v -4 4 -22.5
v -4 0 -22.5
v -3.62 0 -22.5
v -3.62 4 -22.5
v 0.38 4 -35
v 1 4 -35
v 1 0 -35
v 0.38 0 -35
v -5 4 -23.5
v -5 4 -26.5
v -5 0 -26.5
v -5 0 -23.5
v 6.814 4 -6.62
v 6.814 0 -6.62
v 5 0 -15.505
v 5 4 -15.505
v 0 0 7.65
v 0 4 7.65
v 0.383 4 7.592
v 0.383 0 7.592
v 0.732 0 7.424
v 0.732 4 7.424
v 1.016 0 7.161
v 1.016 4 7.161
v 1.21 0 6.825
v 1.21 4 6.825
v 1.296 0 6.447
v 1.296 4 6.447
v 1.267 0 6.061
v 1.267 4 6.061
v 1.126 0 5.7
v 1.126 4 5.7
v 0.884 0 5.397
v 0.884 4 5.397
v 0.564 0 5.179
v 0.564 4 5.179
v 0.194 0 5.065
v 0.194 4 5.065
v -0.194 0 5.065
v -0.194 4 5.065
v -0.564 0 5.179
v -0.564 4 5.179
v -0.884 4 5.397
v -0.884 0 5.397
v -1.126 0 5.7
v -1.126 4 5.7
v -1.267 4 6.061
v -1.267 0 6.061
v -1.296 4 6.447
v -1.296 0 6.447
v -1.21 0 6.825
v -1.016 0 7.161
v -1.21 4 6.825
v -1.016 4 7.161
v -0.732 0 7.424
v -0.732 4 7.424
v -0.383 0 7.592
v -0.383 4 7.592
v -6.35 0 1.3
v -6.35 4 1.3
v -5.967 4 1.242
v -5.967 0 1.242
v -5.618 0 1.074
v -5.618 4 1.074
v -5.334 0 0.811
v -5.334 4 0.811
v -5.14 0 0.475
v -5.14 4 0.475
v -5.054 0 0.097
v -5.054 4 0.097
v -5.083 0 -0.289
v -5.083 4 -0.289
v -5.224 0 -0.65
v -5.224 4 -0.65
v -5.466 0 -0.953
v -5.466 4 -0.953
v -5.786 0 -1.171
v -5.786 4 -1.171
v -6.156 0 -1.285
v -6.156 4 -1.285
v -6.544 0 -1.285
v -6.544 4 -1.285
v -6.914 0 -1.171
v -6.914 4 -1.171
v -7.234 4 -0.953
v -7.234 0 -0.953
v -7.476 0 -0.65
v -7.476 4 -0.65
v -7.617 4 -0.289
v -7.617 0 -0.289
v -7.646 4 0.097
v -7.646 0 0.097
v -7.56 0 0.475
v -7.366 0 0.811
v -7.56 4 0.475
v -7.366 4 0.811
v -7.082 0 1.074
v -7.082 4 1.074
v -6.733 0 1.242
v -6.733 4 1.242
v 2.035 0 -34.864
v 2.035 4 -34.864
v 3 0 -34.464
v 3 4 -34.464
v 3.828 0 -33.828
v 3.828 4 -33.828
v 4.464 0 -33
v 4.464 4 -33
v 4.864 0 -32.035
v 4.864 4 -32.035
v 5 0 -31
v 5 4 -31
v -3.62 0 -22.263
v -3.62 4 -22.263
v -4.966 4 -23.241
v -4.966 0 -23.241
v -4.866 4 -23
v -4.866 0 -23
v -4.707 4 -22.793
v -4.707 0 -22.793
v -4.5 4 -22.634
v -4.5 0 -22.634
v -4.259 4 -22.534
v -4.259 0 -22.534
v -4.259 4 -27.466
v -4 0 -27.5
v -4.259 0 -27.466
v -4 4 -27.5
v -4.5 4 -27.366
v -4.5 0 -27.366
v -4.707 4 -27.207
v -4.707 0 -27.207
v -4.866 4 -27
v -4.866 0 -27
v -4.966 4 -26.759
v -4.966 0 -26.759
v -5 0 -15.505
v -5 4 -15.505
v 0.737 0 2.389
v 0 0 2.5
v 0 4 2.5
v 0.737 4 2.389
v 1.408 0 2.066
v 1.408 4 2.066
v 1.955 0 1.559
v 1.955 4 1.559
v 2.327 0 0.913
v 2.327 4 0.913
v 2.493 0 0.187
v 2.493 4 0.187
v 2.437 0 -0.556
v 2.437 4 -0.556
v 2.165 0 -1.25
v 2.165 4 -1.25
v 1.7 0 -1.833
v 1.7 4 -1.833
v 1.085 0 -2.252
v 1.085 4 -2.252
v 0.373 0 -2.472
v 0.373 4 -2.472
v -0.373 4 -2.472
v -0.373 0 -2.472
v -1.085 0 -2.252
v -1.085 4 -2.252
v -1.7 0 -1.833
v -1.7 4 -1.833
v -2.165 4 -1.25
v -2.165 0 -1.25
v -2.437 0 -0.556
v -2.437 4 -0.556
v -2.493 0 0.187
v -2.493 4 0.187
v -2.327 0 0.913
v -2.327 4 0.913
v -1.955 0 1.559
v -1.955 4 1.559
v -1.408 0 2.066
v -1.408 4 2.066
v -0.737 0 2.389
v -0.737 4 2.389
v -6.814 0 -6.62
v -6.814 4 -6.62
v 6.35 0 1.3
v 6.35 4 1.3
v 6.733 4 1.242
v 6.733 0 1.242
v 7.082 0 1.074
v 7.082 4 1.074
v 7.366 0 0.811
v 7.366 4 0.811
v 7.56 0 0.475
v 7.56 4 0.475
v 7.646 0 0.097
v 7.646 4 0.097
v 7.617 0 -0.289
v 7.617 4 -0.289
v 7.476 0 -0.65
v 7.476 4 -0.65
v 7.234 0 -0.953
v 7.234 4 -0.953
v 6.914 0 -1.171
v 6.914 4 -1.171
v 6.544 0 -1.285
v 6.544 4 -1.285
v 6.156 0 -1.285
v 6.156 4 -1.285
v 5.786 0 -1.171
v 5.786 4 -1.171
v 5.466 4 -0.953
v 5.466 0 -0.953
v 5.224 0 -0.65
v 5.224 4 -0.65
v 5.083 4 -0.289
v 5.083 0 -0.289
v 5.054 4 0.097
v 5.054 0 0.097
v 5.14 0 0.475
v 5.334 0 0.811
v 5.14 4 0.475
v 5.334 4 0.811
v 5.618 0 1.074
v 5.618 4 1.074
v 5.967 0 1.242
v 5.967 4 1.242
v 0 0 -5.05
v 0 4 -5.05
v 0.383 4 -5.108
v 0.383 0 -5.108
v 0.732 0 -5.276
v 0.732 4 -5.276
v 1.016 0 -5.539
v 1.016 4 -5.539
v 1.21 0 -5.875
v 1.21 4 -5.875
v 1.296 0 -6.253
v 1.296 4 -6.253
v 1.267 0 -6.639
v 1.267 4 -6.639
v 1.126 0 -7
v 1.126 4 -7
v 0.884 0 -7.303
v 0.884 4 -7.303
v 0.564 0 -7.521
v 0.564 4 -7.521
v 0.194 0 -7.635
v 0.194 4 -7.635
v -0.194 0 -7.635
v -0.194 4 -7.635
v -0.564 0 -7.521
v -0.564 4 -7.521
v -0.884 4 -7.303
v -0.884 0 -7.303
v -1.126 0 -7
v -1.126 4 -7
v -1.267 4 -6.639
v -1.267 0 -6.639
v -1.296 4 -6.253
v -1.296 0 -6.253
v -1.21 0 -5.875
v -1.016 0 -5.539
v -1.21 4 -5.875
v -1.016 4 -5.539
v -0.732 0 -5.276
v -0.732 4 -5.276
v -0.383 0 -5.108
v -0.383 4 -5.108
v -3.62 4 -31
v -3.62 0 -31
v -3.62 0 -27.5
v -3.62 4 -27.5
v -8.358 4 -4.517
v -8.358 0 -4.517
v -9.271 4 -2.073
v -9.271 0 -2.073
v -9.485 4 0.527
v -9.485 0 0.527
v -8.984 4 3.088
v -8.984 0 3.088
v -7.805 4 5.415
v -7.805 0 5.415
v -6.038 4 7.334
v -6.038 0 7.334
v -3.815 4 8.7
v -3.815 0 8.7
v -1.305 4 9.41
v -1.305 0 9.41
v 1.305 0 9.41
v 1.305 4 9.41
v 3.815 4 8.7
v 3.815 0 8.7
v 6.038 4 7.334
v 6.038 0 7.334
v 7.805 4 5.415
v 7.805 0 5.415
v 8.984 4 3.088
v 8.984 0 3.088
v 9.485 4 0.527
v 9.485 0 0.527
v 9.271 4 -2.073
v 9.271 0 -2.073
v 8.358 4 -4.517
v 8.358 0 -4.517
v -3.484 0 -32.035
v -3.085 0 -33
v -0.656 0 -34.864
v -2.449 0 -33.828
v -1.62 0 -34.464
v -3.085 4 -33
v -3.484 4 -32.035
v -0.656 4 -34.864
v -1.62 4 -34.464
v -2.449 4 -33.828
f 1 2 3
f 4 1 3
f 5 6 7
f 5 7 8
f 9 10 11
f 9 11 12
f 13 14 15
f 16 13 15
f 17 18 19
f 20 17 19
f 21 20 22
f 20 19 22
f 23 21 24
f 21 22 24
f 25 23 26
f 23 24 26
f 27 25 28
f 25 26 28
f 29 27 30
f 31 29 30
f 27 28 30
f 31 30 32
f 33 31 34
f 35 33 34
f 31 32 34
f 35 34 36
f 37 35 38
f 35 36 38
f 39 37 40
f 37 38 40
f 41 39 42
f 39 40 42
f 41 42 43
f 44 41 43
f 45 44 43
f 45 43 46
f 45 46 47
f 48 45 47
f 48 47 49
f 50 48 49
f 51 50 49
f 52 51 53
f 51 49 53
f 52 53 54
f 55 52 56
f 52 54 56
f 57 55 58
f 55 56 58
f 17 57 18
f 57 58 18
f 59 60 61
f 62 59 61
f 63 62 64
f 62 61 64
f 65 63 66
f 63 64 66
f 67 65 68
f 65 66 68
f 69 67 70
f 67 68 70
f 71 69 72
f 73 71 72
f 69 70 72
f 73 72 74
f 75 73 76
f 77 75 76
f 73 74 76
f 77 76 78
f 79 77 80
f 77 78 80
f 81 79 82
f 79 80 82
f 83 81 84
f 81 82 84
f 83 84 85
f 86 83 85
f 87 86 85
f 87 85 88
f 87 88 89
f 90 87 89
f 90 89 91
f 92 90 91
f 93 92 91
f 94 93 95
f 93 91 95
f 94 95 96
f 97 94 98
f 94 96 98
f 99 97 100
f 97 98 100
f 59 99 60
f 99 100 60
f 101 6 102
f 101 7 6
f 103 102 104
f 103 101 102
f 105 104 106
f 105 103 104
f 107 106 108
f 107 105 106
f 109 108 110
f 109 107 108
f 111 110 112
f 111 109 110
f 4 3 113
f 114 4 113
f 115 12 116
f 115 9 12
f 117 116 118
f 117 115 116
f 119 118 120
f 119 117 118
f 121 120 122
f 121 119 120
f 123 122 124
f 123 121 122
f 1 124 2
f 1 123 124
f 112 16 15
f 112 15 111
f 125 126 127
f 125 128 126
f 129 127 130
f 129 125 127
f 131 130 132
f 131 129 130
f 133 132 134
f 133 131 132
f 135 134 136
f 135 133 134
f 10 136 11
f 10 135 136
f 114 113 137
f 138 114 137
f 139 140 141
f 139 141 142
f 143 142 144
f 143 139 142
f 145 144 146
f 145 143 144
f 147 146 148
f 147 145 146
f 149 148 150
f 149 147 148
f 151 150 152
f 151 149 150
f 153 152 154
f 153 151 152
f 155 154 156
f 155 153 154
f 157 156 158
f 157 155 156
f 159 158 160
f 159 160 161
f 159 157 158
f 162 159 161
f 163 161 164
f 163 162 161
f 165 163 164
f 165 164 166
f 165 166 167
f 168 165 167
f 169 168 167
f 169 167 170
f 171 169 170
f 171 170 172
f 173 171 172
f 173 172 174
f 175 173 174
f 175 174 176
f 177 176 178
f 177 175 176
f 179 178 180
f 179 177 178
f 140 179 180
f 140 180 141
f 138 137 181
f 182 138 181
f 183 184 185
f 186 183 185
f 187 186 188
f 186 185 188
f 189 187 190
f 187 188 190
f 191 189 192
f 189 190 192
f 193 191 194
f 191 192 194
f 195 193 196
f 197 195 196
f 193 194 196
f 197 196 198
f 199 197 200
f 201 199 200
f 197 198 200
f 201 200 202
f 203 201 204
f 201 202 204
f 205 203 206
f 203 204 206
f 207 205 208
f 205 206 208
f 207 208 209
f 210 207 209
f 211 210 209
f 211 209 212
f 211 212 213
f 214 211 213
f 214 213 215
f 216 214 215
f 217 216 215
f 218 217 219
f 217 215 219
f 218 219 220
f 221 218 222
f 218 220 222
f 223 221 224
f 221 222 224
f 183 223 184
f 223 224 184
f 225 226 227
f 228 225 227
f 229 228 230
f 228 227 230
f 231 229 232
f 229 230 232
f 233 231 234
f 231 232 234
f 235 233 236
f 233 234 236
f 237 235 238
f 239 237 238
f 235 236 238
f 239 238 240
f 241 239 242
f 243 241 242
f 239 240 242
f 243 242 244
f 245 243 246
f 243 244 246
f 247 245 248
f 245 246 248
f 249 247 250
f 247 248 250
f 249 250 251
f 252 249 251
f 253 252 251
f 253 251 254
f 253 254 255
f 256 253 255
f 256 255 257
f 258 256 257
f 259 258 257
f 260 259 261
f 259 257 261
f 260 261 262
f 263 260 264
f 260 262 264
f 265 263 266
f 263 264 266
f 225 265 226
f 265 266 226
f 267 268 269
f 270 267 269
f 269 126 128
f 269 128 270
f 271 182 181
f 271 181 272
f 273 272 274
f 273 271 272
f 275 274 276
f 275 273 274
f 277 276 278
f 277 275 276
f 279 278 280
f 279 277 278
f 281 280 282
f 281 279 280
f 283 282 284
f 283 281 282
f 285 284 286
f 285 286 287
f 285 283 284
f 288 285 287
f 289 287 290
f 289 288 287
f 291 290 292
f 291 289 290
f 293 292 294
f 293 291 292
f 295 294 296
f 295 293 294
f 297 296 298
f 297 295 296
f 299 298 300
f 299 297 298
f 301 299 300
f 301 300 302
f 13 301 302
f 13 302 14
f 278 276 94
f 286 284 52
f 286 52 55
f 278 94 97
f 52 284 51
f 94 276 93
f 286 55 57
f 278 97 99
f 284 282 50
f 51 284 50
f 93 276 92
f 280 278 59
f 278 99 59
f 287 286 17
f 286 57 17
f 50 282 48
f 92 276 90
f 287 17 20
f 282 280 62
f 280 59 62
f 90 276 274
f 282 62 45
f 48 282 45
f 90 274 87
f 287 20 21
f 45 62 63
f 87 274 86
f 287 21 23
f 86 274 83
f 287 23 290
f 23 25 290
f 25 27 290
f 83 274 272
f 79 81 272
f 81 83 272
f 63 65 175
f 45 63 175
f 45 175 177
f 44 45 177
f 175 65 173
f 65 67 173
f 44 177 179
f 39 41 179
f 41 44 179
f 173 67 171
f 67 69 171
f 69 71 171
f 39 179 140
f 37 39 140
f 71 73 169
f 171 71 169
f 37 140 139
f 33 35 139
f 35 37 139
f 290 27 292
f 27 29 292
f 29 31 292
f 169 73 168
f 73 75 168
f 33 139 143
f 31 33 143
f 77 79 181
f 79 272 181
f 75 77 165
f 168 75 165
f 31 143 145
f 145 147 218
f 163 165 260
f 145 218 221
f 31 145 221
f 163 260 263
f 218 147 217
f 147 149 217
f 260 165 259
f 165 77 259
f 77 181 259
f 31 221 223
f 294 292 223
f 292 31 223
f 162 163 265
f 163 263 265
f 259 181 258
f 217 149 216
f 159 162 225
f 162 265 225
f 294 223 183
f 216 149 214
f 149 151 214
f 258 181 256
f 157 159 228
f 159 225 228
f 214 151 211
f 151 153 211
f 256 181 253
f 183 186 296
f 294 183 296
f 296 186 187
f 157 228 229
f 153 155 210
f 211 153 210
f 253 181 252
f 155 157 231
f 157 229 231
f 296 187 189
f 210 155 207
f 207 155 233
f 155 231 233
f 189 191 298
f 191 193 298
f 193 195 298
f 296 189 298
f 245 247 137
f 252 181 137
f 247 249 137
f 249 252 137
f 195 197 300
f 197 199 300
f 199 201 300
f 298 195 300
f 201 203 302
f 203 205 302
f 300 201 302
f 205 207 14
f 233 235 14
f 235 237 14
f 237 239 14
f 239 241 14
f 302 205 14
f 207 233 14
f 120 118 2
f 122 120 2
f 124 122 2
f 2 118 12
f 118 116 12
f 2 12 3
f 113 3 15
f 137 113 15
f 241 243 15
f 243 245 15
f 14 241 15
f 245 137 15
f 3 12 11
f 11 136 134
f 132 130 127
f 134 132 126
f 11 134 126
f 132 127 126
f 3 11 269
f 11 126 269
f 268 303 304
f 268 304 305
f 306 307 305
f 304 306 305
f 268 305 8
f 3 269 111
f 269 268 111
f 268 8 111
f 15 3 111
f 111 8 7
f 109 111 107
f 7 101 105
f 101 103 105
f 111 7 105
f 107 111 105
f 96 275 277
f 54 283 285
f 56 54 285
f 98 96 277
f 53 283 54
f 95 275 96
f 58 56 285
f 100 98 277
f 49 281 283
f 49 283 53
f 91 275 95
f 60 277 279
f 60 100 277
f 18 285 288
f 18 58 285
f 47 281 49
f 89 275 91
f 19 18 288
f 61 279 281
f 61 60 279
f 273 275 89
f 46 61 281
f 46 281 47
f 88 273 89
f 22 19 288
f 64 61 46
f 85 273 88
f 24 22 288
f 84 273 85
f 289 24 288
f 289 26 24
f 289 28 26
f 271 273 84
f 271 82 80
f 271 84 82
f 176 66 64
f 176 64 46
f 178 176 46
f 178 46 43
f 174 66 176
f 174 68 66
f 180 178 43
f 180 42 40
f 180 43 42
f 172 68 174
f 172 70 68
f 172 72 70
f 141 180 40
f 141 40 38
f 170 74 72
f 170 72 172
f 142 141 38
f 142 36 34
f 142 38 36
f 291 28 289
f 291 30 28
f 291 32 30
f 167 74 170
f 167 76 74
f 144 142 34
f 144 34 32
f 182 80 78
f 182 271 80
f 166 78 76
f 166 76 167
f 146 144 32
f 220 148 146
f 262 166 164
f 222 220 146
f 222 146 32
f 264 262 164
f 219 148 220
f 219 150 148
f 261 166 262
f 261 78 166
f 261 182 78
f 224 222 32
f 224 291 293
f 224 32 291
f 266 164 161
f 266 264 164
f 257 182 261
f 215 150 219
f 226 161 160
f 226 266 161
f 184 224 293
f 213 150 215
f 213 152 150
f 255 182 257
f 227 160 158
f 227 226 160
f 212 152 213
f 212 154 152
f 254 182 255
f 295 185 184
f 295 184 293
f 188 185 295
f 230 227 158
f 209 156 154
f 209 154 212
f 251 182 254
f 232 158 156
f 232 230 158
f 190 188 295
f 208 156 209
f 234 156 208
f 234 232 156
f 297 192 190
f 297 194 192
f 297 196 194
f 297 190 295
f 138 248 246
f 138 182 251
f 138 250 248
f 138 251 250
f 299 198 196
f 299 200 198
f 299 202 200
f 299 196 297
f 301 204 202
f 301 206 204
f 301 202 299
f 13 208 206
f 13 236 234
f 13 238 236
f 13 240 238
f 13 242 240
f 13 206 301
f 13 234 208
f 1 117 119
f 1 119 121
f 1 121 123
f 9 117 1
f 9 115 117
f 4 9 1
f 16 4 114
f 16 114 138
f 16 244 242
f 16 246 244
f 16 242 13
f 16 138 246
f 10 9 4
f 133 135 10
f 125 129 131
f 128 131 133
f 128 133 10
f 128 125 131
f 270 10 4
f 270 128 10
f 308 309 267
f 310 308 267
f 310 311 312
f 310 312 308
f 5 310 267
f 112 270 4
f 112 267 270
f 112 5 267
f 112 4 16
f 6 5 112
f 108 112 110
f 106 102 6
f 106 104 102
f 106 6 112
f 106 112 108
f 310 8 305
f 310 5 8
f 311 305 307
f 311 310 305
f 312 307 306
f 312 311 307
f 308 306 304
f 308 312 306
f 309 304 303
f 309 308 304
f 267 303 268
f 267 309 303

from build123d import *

# Parameters (mm, degrees)
SKETCH1_R           = 3
SKETCH1_R_2         = 2.5
BOSS_EXTRUDE1_DEPTH = 4
SKETCH2_R           = 1.3
CUT_EXTRUDE1_DEPTH  = 4
BOSS_EXTRUDE2_DEPTH = 4
SKETCH4_R           = 3
BOSS_EXTRUDE3_DEPTH = 4
SKETCH6_W           = 1.3795464
SKETCH6_H           = 7.5
CUT_EXTRUDE2_DEPTH  = 9
FILLET3_R           = 4
FILLET4_R           = 1


with BuildPart() as part:
    # Sketch1 → Boss-Extrude1 (new body)
    with BuildSketch(Plane(origin=(0, 0, 0), x_dir=(1, 0, 0), z_dir=(0, 1, 0))):
        with BuildLine():
            Line((-4.531642246, 17.7995776), (-7.838367177, 1.6))
            ThreePointArc((-7.838367177, 1.6), (0, -8), (7.838367177, 1.6))
            Line((7.838367177, 1.6), (4.531642246, 17.7995776))
            ThreePointArc((4.531642246, 17.7995776), (0, 21.499648), (-4.531642246, 17.7995776))
        make_face()
        with Locations(Location((0, 16.87456, 0), (0, 0, 270))):
            Circle(SKETCH1_R, mode=Mode.SUBTRACT)
        with Locations(Location((0, 0, 0), (0, 0, 270))):
            Circle(SKETCH1_R_2, mode=Mode.SUBTRACT)
    extrude(amount=BOSS_EXTRUDE1_DEPTH)

    # Sketch2 → Cut-Extrude1 (cut)
    with BuildSketch(Plane(origin=(0, 4, 0), x_dir=(1, 0, 0), z_dir=(0, 1, 0))):
        with Locations(Location((0, 6.35, 0), (0, 0, 270))):
            Circle(SKETCH2_R)
        with Locations(Location((6.35, 0, 0), (0, 0, 270))):
            Circle(SKETCH2_R)
        with Locations(Location((0, -6.35, 0), (0, 0, 270))):
            Circle(SKETCH2_R)
        with Locations(Location((-6.35, 0, 0), (0, 0, 270))):
            Circle(SKETCH2_R)
    extrude(amount=-CUT_EXTRUDE1_DEPTH, mode=Mode.SUBTRACT)

    # Sketch3 → Boss-Extrude2 (add)
    with BuildSketch(Plane(origin=(0, 4, 0), x_dir=(1, 0, 0), z_dir=(0, 1, 0))):
        with BuildLine():
            Line((-7.838367177, 1.6), (-6.8136721, 6.619960159))
            ThreePointArc((-6.8136721, 6.619960159), (0, -9.5), (6.8136721, 6.619960159))
            Line((6.8136721, 6.619960159), (7.838367177, 1.6))
            ThreePointArc((7.838367177, 1.6), (0, -8), (-7.838367177, 1.6))
        make_face()
    extrude(amount=-BOSS_EXTRUDE2_DEPTH)

    # Sketch4 → Boss-Extrude3 (add)
    with BuildSketch(Plane(origin=(0, 4, 0), x_dir=(1, 0, 0), z_dir=(0, 1, 0))):
        with BuildLine():
            Line((5, 35), (0, 35))
            Line((0, 35), (-5, 35))
            Line((-5, 35), (-5, 15.505102572))
            Line((-5, 15.505102572), (-4.531642246, 17.7995776))
            ThreePointArc((-4.531642246, 17.7995776), (0, 21.499648), (4.531642246, 17.7995776))
            Line((4.531642246, 17.7995776), (5, 15.505102572))
            Line((5, 15.505102572), (5, 35))
        make_face()
        with BuildLine():
            Line((5, 10), (5, 15.505102572))
            Line((5, 15.505102572), (4.531642246, 17.7995776))
            ThreePointArc((4.531642246, 17.7995776), (0, 21.499648), (-4.531642246, 17.7995776))
            Line((-4.531642246, 17.7995776), (-5, 15.505102572))
            Line((-5, 15.505102572), (-5, 10))
            Line((-5, 10), (0, 10))
            Line((0, 10), (5, 10))
        make_face()
        with Locations((0, 16.87456)):
            Circle(SKETCH4_R, mode=Mode.SUBTRACT)
        with Locations((0, 16.87456)):
            Circle(SKETCH4_R)
    extrude(amount=-BOSS_EXTRUDE3_DEPTH)

    # Sketch6 → Cut-Extrude2 (cut)
    with BuildSketch(Plane.XZ):
        with Locations((-4.3102268, -31.25)):
            Rectangle(SKETCH6_W, SKETCH6_H)
        Polygon((-3.6204536, -22.263472087), (-5, -15.505102572), (-5, -22.5), (-3.6204536, -22.5), align=None)
    extrude(amount=-CUT_EXTRUDE2_DEPTH, mode=Mode.SUBTRACT)

    # Fillet3
    fillet3_edges = [part.edges().sort_by_distance(p)[0] for p in [
        (5, 2, -35),
        (-3.6204536, 2, -35),
    ]]
    fillet(fillet3_edges, radius=FILLET3_R)

    # Fillet4
    fillet4_edges = [part.edges().sort_by_distance(p)[0] for p in [
        (-5, 2, -22.5),
        (-5, 2, -27.5),
    ]]
    fillet(fillet4_edges, radius=FILLET4_R)


solid = part.part
